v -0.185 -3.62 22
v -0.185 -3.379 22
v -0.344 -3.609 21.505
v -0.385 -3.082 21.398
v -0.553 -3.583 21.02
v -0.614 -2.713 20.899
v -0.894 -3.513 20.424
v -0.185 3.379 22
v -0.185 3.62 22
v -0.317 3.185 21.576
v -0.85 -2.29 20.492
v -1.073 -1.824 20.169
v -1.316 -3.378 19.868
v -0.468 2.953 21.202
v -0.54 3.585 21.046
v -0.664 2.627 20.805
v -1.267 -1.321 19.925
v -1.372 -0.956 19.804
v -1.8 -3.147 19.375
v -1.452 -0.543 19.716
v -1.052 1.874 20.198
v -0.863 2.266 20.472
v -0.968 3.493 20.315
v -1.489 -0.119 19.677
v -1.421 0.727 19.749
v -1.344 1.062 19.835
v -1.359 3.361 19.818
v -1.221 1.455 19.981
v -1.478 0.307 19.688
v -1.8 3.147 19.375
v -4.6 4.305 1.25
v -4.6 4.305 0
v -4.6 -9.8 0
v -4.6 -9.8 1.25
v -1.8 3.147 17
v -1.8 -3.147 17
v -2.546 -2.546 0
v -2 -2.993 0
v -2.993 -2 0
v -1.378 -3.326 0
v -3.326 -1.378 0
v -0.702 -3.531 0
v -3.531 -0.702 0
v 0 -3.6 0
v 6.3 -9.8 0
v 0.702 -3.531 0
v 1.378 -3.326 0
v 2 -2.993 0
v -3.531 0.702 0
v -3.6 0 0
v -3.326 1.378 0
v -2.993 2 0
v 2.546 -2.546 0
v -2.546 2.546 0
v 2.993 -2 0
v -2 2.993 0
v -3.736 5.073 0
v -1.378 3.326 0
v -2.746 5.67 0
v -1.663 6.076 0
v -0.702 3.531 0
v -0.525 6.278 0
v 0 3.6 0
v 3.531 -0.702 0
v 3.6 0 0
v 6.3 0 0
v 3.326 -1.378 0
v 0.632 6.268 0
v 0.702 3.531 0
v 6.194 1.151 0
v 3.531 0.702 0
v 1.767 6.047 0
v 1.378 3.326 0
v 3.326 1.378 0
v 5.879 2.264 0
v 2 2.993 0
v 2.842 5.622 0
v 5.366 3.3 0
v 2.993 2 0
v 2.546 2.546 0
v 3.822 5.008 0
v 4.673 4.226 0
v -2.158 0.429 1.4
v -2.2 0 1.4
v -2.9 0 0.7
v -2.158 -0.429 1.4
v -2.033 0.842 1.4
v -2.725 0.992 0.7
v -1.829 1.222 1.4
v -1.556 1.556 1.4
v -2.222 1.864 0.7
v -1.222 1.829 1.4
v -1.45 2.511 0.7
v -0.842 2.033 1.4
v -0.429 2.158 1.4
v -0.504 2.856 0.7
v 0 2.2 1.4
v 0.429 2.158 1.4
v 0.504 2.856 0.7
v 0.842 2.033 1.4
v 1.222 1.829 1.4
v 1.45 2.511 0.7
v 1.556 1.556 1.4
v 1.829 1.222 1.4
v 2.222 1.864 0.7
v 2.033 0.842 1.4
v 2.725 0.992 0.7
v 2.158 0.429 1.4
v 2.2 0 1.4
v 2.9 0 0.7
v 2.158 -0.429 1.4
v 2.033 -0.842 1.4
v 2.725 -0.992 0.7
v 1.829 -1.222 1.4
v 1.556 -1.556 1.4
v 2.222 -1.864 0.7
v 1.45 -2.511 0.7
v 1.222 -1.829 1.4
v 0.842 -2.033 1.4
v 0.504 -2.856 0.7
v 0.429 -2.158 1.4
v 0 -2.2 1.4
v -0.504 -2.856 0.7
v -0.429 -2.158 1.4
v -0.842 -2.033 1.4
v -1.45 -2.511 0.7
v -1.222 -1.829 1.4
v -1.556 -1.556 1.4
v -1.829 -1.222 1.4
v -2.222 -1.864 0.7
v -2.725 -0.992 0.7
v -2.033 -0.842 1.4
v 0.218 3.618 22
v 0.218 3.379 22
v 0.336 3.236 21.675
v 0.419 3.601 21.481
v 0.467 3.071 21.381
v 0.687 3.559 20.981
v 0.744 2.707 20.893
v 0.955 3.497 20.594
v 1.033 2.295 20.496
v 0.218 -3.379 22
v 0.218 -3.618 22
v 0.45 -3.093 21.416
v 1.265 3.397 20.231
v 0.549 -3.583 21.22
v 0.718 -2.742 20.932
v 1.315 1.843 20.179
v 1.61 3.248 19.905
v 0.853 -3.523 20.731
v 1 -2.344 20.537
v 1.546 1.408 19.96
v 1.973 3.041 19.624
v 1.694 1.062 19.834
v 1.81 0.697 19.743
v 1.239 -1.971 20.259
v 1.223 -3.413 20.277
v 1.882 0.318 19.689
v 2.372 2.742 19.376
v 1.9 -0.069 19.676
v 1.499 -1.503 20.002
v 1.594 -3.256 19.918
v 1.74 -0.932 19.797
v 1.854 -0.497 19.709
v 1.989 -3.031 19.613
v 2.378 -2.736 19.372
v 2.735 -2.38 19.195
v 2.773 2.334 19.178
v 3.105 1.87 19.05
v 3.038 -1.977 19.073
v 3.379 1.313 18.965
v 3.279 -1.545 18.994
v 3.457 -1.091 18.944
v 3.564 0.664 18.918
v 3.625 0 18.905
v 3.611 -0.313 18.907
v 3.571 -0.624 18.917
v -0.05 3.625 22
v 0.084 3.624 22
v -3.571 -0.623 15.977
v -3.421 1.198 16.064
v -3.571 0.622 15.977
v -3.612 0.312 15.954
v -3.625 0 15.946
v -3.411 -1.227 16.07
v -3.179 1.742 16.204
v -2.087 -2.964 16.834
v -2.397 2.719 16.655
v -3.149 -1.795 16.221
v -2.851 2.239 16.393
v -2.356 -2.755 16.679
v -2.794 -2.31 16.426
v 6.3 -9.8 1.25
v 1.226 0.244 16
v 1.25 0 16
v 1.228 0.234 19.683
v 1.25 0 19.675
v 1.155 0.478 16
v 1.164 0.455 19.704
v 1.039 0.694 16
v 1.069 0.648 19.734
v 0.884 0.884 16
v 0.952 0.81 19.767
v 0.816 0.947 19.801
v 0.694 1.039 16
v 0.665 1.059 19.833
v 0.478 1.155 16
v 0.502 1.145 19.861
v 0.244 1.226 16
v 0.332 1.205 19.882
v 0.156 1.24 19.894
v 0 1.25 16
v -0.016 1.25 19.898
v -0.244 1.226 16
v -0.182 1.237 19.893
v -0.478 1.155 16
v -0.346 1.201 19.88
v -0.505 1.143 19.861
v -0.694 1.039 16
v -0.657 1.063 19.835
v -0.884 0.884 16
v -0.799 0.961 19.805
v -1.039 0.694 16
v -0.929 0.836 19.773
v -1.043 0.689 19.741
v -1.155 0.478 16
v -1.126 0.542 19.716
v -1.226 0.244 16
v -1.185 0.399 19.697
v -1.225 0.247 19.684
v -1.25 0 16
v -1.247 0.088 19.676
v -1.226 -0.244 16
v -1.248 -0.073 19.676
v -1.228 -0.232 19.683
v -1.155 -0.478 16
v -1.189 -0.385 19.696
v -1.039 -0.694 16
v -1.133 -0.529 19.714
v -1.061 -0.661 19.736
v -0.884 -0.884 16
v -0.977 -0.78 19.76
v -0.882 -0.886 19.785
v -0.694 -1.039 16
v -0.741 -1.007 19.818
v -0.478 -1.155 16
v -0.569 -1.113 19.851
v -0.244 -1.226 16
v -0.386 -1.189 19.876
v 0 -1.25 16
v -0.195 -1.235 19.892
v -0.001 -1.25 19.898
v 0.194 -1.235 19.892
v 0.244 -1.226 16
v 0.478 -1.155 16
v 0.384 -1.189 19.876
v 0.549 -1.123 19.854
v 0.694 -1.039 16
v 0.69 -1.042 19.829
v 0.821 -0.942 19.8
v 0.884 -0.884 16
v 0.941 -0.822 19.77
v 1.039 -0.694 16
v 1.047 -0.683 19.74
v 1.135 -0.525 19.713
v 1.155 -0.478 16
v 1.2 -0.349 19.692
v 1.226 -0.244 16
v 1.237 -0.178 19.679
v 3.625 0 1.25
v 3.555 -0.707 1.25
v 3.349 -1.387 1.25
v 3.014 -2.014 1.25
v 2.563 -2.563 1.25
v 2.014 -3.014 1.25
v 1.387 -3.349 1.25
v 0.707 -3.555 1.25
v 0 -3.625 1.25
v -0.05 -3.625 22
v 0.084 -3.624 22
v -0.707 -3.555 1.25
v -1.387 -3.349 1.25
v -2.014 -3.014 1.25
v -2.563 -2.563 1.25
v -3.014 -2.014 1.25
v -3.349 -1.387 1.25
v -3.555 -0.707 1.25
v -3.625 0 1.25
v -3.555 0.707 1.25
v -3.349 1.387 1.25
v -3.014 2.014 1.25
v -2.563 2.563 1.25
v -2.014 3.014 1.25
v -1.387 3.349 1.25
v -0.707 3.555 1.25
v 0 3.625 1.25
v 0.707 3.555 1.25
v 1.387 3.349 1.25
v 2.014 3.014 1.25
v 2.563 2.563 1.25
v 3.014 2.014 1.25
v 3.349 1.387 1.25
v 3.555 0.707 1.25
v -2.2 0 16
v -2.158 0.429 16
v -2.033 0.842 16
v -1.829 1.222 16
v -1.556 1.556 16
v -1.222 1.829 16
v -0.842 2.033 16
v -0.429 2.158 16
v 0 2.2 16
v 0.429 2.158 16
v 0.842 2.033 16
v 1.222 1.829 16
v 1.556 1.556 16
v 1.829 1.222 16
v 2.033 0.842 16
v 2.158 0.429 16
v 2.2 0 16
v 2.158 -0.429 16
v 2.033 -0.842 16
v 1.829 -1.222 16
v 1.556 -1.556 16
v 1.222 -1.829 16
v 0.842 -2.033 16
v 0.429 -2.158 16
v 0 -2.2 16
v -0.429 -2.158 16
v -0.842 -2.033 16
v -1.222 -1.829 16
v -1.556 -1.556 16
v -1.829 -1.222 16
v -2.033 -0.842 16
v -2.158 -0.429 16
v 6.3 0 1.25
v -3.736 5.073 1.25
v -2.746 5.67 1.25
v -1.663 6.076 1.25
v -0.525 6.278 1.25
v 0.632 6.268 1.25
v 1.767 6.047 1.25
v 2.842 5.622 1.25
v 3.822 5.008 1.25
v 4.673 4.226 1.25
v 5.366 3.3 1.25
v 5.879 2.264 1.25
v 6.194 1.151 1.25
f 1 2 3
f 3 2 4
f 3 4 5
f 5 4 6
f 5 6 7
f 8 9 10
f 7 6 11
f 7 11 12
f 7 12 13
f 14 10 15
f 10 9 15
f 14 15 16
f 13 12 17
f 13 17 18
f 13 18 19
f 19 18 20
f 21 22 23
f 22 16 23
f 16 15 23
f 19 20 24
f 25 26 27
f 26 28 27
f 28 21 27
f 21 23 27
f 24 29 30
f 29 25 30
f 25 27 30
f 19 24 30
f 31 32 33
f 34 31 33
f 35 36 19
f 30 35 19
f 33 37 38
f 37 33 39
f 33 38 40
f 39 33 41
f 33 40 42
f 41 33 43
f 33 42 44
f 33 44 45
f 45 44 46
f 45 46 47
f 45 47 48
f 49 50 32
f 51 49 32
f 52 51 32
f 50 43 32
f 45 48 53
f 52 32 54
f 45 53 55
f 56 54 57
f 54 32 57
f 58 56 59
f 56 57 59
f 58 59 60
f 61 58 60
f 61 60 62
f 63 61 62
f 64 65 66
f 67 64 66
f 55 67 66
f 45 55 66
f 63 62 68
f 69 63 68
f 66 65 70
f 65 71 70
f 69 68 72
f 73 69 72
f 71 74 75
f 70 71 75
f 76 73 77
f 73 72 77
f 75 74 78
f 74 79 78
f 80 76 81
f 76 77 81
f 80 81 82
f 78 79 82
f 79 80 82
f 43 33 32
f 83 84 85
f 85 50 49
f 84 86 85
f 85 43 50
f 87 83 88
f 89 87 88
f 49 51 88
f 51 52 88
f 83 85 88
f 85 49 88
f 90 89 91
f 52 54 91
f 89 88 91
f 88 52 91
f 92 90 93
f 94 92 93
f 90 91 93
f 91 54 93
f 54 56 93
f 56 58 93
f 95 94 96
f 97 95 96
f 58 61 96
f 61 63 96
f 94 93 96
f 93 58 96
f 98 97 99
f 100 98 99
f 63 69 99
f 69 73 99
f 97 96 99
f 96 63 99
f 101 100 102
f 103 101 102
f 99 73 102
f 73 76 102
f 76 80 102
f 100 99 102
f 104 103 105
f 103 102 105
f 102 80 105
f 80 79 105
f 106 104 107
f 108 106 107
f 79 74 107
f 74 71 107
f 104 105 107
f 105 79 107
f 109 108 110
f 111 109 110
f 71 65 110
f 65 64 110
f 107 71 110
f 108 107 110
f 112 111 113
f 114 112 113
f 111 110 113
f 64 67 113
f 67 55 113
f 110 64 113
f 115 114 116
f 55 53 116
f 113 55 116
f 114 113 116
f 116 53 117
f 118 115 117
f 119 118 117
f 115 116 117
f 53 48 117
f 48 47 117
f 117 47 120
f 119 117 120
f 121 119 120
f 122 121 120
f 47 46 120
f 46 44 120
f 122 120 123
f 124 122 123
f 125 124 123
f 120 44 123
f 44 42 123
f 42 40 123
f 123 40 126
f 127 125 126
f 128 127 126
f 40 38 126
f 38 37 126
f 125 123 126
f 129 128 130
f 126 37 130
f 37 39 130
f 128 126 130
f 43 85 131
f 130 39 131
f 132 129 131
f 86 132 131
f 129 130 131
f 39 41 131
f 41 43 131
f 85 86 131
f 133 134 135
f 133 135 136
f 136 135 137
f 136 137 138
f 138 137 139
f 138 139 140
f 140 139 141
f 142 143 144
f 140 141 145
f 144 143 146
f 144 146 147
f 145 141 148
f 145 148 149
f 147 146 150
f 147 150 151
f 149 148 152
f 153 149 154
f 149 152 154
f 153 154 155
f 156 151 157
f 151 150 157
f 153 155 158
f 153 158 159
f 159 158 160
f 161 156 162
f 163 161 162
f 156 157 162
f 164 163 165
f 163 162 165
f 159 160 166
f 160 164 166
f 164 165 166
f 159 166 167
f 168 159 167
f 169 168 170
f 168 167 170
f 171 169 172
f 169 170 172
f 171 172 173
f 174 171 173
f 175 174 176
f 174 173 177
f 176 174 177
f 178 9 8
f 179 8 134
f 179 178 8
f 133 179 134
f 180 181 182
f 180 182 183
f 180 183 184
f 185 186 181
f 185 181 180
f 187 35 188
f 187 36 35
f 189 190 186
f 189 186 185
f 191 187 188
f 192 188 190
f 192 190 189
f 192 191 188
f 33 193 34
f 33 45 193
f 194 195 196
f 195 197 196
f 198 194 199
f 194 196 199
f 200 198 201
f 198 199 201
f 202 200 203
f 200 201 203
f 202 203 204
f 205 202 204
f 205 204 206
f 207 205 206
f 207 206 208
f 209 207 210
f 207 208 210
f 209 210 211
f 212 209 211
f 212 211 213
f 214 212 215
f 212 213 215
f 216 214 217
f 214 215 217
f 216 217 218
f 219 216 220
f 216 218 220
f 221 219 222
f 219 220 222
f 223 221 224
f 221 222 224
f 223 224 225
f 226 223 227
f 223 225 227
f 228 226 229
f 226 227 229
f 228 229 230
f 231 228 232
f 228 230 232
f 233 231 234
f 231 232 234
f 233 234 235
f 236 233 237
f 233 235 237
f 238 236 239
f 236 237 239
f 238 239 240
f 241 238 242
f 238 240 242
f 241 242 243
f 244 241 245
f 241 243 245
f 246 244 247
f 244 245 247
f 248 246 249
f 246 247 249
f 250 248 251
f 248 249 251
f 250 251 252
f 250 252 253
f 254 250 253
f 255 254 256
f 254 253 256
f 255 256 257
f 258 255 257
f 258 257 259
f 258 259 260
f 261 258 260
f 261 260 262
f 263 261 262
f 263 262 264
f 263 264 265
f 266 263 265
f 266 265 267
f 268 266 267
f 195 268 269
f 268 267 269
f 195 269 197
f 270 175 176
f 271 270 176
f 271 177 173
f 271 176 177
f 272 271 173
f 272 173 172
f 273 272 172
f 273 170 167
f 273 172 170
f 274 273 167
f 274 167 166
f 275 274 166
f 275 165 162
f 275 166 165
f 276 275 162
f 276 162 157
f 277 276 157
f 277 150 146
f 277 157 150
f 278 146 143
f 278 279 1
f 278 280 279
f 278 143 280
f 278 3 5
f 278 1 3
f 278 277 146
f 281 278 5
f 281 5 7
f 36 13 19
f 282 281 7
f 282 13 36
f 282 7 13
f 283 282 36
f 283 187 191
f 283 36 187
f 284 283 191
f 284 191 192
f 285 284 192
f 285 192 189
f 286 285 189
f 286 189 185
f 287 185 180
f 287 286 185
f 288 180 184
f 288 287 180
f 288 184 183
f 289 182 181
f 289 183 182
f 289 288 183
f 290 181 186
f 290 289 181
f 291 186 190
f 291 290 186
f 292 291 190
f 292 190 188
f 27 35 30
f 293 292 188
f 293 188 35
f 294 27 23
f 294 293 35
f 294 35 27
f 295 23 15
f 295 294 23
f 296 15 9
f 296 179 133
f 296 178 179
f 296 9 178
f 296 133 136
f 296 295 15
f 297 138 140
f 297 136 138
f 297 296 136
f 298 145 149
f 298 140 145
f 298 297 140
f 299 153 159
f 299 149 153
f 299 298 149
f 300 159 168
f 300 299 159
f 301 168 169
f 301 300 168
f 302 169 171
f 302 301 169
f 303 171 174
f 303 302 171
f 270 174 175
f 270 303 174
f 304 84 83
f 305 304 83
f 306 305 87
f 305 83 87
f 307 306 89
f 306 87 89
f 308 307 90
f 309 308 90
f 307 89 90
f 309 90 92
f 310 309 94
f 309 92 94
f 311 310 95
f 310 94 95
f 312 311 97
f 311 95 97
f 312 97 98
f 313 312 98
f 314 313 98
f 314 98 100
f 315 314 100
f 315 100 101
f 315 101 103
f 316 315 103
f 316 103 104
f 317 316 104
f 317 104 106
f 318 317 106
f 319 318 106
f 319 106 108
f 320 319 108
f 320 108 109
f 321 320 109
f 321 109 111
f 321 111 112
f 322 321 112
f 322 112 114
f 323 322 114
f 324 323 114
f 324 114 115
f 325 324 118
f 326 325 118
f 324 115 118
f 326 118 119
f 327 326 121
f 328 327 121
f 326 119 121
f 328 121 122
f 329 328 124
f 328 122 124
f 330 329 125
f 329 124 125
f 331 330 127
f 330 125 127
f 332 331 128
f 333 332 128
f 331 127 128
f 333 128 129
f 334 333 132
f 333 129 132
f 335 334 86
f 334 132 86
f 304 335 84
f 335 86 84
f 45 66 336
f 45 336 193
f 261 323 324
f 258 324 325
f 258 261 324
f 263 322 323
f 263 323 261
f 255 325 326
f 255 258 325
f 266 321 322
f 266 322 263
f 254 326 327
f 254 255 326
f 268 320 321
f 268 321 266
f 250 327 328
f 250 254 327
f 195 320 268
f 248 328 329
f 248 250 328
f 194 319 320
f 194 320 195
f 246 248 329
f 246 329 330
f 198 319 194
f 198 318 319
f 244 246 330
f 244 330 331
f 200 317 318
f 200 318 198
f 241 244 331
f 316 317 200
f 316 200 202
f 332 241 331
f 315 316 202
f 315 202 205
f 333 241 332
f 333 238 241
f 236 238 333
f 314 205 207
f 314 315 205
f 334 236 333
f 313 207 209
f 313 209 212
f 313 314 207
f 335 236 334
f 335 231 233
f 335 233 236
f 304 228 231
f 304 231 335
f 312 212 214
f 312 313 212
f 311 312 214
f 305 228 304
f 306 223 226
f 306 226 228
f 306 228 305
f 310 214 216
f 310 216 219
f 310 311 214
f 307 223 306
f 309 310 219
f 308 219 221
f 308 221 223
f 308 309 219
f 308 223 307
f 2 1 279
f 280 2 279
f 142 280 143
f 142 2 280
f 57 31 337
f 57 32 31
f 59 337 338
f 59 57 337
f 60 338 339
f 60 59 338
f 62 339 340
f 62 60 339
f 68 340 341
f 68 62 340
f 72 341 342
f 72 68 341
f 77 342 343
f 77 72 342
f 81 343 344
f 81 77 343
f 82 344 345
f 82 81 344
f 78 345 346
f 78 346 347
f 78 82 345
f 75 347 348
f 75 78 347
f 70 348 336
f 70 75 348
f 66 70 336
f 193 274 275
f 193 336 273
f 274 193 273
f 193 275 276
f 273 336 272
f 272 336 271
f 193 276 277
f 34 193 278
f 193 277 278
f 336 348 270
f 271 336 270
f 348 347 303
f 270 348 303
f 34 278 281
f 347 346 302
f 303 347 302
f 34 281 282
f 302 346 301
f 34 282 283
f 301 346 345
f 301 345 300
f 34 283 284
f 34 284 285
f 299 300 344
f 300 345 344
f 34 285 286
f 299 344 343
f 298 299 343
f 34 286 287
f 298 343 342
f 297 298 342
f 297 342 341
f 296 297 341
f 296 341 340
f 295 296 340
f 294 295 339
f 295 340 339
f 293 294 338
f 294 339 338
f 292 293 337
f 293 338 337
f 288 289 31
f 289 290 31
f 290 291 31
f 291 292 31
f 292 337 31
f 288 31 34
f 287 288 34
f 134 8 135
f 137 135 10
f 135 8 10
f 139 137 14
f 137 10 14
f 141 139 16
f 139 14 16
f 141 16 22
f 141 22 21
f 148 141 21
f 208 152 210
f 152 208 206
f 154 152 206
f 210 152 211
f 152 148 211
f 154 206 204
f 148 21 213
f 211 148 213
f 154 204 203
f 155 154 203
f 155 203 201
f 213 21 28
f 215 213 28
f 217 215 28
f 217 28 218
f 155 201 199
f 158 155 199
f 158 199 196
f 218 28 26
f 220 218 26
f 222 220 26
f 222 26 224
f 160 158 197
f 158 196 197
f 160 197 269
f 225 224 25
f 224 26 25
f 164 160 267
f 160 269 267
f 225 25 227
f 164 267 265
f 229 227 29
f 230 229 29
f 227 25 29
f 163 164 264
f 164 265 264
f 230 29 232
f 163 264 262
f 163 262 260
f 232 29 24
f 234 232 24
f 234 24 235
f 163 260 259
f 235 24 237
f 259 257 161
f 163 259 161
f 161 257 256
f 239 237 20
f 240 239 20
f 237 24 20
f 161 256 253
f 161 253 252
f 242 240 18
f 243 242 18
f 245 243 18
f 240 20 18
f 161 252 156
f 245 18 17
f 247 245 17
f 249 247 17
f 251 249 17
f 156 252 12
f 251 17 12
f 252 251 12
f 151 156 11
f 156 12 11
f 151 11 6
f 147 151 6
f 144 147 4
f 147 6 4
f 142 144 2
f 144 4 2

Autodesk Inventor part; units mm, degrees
ref_plane "YZ Plane" through (0, 0, 0) normal (1, 0, 0) x (0, 1, 0)
ref_plane "XZ Plane" through (0, 0, 0) normal (0, 1, 0) x (-1, 0, 0)
ref_plane "XY Plane" through (0, 0, 0) normal (0, 0, 1) x (1, 0, 0)
sketch "Sketch1" plane through (0, 0, 0) normal (0, 0, 1) x (1, 0, 0)
  circle A0 centre (0, 0) radius 3.625
  dimension "d0" = 7.25
extrude "Extrusion1" add sketch "Sketch1" along normal blind 22
sketch "Sketch2" plane through (0, 0, 0) normal (0, 0, -1) x (-1, 0, 0)
  arc A0 (4.6, 4.3046) -> (-6.3, 0) centre (0, 0) ccw
  line L0 (4.6, 4.3046) -> (4.6, -9.8)
  line L1 (-6.3, 0) -> (-6.3, -9.8)
  line L2 (-6.3, -9.8) -> (4.6, -9.8)
  dimension "d3" = 6.3
  dimension "d4" = 4.6
  dimension "d5" = 9.8
extrude "Extrusion2" add sketch "Sketch2" against normal blind 1.25
sketch "Sketch3" plane through (0, 0, 0) normal (0, 0, -1) x (-1, 0, 0)
  circle A0 centre (0, 0) radius 2.2
  dimension "d8" = 4.4
extrude "Extrusion3" cut sketch "Sketch3" against normal blind 16
sketch "Sketch4" plane through (0, 0, 22) normal (0, 0, 1) x (1, 0, 0)
  circle A0 centre (0, 0) radius 2.2 projected
  circle A1 centre (0, 0) radius 1.25
  dimension "d11" = 2.5
extrude "Extrusion4" cut sketch "Sketch4" against normal up to next contours A1
chamfer "Chamfer1" distance 1.4 angle 45 1 edges at (2.2, 0, 0)
sketch "Sketch5" plane through (0, 0, 0) normal (0, 1, 0) x (-1, 0, 0)
  line L0 (3.625, 1.25) -> (3.625, 22) projected
  line L1 (-3.625, 1.25) -> (-3.625, 22) projected
  line L2 (3.625, 22) -> (-3.625, 22) projected
  line L3 (3.625, 17) -> (1.8, 17)
  line L4 (1.8, 17) -> (1.8, 22)
  line L5 (1.8, 22) -> (3.625, 22)
  line L6 (3.625, 22) -> (3.625, 17)
  line L7 (-3.6, 0) -> (3.6, 0) projected
  line L8 (1.8, 17) -> (3.625, 15.9463)
  line L9 (3.625, 1.25) -> (3.625, 22) projected
  line L10 (1.8, 17) -> (3.9073, 17) construction
  line L11 (3.625, 15.9463) -> (3.625, 17)
  point P0 (0, 0)
  dimension "d17" = 5.425
  dimension "d18" = 17
  dimension "d21" = 30
extrude "Extrusion5" cut sketch "Sketch5" along normal through all both and the other way through all
sketch "Sketch6" plane through (0, 0, 0) normal (0, 1, 0) x (-1, 0, 0)
  line L0 (1.8, 22) -> (-3.625, 22) projected
  line L1 (-1.25, 22) -> (1.25, 22) projected
  line L2 (0, 22) -> (0, 19.2621) construction
  circle A0 centre (-4.6, 23.4) radius 4.6
  circle A1 centre (5.4, 23.4) radius 5.4
  line L3 (12.1762, 23.4) -> (-11.9471, 23.4)
  point P0 (0, 0)
  dimension "d22" = 4.6
  dimension "d23" = 5.4
  dimension "d24" = 1.4
extrude "Extrusion6" cut sketch "Sketch6" along normal through all both and the other way through all contours A1 L3 | A0 L3 | L3 A0 | A1 L3
sketch "Sketch7" plane through (0, 0, 0) normal (1, 0, 0) x (0, 1, 0)
  line L0 (-3.1465, 19.3751) -> (3.1465, 19.3751) projected
  line L1 (1.2308, 22) -> (3.6184, 22) projected
  line L2 (3.6184, 22) -> (3.6184, 24.6476)
  line L3 (0, 19.6751) -> (0, 24.6476) construction
  circle A0 centre (0, 23.2935) radius 3.6184
  point P0 (0, 0)
  point P1 (0, 19.3751)
  dimension "d29" = 0.3
extrude "Extrusion7" cut sketch "Sketch7" along normal through all both and the other way through all contours A0
properties part number "guide tube"
